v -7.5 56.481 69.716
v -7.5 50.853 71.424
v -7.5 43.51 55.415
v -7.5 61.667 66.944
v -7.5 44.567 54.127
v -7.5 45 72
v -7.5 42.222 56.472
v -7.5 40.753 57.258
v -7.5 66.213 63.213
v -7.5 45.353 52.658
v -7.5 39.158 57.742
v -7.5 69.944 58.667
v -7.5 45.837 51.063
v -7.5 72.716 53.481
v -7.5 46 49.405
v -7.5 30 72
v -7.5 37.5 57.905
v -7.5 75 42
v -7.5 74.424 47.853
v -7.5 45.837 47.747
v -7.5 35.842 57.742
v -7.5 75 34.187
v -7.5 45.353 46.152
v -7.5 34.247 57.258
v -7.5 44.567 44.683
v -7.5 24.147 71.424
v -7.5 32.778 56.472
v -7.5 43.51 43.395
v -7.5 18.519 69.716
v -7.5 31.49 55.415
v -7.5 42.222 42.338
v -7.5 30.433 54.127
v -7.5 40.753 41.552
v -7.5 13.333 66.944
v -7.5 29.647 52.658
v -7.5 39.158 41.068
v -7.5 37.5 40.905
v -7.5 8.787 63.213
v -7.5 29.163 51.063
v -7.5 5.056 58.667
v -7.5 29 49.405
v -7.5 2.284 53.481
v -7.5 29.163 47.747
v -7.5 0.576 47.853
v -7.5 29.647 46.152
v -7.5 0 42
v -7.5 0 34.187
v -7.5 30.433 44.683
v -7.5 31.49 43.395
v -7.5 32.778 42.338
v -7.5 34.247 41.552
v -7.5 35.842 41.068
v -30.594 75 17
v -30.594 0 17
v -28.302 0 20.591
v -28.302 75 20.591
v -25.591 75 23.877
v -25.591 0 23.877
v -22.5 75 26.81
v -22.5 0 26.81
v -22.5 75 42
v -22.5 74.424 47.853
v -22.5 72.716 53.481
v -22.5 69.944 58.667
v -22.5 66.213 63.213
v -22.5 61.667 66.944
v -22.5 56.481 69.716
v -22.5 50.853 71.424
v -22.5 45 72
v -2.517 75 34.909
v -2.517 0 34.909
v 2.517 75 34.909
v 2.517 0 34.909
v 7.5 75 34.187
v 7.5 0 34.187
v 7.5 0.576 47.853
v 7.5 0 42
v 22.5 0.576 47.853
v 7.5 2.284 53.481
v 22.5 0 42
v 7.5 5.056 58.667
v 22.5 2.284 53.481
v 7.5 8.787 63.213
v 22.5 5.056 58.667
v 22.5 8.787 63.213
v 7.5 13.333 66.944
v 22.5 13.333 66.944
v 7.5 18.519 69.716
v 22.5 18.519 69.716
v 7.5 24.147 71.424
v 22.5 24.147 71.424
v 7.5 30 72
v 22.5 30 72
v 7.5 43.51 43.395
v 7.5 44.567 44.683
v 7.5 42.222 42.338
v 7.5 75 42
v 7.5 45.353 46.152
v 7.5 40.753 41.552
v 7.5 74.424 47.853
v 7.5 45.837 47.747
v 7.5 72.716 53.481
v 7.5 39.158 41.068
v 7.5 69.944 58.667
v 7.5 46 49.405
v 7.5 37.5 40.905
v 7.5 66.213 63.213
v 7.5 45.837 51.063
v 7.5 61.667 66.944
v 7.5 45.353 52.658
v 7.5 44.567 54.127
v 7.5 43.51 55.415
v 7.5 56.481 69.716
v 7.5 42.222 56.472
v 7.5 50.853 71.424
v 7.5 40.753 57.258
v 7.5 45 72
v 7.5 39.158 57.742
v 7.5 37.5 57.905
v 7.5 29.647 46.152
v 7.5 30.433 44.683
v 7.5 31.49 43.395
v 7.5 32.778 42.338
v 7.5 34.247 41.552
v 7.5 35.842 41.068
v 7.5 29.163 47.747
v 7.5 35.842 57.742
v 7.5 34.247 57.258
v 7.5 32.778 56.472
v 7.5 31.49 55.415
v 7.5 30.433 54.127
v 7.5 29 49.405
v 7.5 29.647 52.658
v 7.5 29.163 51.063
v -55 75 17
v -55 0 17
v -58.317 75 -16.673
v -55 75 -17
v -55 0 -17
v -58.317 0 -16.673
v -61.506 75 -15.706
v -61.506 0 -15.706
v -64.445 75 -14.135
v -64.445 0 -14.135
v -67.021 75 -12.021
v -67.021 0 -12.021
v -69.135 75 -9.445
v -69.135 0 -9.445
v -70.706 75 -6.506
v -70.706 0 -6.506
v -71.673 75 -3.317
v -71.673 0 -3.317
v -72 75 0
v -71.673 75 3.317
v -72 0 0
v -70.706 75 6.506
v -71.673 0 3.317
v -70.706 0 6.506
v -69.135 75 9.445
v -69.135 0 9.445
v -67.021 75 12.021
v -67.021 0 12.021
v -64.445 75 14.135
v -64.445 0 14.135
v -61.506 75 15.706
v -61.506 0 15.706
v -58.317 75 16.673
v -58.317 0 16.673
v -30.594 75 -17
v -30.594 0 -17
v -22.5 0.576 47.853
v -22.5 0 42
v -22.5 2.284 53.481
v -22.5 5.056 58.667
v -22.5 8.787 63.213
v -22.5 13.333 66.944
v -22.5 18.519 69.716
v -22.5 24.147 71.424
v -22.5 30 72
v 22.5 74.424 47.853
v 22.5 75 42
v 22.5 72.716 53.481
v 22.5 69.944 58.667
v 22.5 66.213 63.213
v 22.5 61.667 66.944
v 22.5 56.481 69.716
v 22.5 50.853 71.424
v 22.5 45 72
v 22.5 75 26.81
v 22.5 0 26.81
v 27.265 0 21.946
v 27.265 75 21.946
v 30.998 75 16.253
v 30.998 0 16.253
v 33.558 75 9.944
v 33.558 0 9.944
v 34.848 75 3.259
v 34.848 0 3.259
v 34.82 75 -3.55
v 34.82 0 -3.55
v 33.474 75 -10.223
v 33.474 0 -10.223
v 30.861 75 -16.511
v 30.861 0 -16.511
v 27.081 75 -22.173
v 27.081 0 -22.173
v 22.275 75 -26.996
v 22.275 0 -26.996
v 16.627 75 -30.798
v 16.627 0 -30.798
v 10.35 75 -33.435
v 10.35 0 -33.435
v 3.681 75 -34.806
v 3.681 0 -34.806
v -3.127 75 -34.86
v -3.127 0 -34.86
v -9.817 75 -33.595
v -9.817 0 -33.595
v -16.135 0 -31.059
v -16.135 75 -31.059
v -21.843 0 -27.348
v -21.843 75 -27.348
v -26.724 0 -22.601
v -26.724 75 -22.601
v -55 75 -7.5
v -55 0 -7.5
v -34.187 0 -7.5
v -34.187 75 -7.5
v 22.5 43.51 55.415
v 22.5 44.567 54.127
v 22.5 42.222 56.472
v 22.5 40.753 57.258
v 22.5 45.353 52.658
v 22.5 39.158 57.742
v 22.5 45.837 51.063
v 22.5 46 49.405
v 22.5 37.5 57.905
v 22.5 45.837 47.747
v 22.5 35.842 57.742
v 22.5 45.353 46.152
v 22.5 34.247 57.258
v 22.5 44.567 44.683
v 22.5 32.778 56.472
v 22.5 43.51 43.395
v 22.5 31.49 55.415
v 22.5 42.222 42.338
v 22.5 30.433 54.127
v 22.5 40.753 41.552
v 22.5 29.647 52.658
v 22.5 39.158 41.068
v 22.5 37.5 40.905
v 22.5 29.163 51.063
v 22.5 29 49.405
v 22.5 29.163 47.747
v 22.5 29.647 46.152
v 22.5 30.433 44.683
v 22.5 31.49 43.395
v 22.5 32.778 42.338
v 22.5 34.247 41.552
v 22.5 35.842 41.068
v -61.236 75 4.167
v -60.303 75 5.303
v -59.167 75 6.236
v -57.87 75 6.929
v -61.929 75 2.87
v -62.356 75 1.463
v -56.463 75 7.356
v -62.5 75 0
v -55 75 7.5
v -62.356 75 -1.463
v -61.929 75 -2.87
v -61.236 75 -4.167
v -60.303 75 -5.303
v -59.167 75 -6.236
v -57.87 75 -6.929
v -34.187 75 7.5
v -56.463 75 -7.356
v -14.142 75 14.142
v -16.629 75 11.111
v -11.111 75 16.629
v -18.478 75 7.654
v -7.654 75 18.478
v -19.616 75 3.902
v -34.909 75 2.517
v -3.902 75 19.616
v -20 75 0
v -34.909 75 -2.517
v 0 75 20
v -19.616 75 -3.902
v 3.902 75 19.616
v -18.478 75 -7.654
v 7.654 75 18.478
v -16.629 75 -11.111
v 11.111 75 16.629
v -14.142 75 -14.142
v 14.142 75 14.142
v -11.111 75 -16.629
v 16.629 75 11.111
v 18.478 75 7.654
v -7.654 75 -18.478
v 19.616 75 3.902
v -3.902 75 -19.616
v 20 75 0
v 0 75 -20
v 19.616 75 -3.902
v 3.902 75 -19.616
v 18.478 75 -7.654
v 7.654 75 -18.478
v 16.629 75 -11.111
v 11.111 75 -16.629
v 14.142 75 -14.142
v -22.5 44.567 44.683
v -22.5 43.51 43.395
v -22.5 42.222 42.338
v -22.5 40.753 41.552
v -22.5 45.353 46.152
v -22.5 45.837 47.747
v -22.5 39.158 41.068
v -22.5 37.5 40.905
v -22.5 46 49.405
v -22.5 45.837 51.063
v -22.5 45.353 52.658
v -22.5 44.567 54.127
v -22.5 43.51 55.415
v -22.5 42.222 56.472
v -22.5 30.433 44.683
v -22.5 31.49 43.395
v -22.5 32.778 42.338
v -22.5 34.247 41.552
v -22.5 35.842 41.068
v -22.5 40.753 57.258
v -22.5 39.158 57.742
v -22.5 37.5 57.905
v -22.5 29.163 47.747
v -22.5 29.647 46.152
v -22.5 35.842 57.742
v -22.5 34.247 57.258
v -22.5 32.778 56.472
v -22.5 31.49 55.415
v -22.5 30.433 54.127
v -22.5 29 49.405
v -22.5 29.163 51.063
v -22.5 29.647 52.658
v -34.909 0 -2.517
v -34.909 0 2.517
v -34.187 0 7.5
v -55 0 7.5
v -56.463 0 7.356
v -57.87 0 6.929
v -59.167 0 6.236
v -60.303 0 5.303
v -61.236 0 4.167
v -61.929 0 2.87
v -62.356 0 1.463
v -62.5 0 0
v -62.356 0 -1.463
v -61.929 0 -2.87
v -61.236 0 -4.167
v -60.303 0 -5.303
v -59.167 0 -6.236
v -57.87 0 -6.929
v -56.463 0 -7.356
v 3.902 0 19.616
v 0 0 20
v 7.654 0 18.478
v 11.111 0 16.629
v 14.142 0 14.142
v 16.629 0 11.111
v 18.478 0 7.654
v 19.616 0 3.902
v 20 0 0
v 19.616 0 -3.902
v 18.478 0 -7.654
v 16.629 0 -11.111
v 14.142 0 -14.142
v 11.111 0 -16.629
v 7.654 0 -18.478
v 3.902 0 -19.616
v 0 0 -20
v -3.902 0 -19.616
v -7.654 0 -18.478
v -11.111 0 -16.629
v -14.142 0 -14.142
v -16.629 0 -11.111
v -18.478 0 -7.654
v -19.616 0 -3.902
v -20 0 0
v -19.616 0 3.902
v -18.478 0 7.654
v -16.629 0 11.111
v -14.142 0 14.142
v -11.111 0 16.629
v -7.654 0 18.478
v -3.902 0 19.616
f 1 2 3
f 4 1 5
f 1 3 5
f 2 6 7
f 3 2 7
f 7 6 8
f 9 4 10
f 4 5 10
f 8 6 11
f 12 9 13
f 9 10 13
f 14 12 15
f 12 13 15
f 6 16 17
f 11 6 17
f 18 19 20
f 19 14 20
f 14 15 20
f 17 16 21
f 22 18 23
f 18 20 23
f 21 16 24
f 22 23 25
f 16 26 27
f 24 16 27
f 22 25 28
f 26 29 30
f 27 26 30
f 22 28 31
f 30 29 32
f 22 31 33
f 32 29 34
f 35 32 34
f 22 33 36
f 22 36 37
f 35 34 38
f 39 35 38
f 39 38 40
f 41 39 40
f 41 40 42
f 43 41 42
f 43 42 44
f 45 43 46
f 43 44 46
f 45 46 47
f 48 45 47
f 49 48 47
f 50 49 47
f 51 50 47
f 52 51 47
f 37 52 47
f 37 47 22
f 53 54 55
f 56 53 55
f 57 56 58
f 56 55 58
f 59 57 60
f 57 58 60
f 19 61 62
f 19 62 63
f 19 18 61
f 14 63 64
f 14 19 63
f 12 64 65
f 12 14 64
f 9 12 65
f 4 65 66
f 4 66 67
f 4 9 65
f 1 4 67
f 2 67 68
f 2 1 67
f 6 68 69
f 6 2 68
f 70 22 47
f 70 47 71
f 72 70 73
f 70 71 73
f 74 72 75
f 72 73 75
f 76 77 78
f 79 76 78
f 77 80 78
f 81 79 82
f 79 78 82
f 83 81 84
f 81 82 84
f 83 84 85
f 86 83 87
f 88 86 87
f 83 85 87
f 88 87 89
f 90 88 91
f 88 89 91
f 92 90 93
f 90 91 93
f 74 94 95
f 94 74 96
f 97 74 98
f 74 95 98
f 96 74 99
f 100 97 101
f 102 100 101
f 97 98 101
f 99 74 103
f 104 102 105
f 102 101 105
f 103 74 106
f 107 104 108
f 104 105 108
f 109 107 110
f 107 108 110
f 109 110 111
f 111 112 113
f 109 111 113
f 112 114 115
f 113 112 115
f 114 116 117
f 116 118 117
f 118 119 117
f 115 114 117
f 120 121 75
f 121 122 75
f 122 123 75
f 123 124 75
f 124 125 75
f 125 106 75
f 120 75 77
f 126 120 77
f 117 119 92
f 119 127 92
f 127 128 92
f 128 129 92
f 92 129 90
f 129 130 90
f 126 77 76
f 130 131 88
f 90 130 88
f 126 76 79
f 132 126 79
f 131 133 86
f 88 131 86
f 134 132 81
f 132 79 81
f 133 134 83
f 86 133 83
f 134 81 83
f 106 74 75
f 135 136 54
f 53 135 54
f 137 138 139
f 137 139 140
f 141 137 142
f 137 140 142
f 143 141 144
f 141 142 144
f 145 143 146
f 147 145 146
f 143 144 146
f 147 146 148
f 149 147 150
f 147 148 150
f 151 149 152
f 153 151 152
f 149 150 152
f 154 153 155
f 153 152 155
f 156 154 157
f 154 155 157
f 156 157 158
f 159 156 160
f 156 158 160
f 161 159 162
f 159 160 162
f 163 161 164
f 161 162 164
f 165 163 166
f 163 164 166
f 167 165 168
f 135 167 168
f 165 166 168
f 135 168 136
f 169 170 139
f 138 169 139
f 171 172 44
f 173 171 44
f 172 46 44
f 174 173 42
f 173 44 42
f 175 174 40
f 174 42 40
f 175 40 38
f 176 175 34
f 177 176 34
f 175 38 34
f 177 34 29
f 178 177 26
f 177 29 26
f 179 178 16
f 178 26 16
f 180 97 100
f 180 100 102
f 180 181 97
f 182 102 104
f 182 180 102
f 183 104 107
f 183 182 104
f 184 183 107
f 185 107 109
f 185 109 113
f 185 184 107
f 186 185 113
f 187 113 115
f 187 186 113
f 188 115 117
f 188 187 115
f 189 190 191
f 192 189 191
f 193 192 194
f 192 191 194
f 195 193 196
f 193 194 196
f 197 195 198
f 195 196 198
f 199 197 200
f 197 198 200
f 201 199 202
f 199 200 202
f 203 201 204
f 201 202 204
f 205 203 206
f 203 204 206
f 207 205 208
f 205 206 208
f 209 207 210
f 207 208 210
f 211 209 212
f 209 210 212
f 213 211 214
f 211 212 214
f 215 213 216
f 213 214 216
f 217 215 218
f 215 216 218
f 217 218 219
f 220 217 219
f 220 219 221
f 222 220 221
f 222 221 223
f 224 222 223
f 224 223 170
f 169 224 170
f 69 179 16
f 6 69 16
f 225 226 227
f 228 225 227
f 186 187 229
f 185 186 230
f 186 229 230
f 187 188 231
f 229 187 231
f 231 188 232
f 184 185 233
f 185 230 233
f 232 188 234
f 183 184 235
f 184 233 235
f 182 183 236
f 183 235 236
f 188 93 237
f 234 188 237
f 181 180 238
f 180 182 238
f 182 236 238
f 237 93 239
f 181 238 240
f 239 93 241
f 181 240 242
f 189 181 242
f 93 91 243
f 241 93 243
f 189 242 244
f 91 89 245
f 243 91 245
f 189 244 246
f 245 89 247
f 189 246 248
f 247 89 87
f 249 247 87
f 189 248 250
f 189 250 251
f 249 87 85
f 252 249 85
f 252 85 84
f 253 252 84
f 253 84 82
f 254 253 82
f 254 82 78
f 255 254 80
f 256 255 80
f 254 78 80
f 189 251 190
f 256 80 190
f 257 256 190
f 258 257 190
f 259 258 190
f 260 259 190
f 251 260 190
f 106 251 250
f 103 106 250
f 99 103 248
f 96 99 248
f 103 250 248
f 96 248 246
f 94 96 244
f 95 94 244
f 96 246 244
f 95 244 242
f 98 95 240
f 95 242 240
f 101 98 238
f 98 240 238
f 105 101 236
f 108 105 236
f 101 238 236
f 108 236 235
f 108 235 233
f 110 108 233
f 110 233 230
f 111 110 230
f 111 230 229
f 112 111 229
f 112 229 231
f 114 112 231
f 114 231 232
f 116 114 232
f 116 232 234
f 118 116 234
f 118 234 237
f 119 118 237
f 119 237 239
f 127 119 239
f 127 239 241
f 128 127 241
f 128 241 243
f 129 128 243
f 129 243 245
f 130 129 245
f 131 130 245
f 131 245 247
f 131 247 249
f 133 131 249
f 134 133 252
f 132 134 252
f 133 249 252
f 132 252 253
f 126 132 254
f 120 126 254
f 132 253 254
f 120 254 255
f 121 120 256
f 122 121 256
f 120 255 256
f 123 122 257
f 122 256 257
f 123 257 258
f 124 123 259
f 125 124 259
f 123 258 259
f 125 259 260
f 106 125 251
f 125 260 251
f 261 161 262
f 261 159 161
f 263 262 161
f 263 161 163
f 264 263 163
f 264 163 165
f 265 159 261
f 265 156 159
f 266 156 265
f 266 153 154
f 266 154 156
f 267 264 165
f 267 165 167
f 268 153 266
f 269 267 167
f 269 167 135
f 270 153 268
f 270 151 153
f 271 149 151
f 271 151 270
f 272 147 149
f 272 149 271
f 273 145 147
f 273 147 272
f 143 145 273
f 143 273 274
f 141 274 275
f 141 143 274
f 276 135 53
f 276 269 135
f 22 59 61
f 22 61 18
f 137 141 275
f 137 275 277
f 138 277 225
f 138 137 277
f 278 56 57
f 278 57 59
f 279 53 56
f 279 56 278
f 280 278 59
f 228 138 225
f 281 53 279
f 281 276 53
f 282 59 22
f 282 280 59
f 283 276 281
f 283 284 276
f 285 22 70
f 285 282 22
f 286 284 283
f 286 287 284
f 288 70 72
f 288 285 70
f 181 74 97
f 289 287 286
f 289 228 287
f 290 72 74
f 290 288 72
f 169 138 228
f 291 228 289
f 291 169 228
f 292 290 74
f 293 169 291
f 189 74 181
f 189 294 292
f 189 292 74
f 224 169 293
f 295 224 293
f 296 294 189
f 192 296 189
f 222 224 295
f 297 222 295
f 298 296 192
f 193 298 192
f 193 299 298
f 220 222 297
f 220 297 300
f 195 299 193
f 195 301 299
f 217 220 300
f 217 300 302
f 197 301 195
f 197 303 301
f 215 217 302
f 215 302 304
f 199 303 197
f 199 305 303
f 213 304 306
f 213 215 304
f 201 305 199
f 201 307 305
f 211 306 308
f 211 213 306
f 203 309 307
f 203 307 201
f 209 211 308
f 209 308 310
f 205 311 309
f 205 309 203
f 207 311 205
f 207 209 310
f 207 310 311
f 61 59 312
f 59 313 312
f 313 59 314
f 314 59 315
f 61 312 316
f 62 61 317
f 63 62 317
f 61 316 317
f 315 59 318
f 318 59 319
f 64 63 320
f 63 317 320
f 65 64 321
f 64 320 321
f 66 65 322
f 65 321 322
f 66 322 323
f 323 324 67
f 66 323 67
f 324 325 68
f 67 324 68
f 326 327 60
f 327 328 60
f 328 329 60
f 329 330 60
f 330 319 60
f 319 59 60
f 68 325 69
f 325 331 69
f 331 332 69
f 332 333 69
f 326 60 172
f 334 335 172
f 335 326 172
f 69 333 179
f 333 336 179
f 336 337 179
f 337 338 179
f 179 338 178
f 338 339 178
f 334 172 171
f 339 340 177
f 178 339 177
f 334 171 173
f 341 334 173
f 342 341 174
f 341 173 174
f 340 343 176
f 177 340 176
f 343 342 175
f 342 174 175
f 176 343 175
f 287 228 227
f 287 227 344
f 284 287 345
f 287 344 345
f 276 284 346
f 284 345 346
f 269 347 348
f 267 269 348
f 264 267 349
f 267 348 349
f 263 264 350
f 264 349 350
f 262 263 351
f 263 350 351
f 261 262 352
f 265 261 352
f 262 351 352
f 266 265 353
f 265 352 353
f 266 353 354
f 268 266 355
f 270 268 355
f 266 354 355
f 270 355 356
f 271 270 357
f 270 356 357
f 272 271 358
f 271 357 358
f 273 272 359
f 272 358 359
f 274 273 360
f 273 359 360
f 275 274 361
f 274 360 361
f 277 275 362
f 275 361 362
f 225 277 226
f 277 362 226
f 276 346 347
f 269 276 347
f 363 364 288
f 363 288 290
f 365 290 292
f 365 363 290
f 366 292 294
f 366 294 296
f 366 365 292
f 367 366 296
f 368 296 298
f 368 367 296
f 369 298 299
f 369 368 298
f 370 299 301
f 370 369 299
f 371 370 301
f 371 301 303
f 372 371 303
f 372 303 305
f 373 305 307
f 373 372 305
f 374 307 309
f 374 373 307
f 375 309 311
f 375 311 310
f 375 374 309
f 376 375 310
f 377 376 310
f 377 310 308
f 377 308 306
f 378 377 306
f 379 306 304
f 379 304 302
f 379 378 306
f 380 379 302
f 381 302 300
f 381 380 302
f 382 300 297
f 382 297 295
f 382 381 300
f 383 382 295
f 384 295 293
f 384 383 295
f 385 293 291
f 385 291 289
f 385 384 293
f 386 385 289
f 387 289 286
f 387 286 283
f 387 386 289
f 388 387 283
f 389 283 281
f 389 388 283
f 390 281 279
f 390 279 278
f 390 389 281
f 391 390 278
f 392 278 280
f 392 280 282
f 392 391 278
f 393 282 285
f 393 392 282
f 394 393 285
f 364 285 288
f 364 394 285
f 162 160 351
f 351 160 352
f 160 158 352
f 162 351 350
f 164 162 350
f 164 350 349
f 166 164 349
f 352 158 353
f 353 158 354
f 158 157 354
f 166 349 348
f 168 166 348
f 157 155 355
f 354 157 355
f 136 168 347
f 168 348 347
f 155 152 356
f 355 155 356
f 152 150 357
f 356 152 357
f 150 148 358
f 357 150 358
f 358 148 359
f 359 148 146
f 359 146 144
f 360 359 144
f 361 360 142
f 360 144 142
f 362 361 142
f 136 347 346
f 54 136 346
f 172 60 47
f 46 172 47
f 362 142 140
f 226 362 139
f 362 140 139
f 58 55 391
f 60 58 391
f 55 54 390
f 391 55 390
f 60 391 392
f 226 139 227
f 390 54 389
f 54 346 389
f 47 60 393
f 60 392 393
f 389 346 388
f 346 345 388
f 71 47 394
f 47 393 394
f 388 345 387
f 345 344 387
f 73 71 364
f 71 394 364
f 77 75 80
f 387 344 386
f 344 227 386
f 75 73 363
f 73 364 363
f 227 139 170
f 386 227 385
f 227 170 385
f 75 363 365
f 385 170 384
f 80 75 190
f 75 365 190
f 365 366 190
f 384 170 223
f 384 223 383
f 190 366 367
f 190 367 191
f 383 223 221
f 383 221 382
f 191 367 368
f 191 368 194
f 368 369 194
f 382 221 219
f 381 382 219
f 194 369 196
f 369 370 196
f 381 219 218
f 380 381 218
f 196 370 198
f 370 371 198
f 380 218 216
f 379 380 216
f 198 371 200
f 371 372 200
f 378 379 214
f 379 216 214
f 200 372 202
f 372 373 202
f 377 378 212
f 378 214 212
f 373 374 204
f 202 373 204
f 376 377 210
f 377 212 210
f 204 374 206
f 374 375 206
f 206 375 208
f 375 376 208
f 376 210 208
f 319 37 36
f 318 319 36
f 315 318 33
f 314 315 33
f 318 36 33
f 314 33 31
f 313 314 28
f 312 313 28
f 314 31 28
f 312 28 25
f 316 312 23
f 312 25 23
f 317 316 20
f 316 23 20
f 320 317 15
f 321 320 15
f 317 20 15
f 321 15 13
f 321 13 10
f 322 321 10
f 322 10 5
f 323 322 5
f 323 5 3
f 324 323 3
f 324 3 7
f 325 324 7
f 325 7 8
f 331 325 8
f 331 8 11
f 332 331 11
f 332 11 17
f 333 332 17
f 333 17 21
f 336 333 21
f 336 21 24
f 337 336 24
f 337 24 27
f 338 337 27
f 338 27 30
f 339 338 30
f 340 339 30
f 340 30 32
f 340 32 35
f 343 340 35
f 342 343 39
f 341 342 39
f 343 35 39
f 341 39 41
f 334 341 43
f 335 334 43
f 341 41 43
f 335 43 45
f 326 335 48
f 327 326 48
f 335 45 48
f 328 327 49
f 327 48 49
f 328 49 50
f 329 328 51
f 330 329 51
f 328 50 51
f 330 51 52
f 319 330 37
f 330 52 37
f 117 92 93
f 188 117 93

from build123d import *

# Parameters (mm, degrees)
SKETCH1_R                      = 35
SKETCH1_R_2                    = 20
BOSS_EXTRUDE2_DEPTH            = 75
CUT_EXTRUDE1_REACH             = 142.496
SKETCH2_R                      = 8.5
CUT_EXTRUDE1_DIRECTION_2_DEPTH = 141.496441236
FILLET1_R                      = 30


with BuildPart() as part:
    # Sketch1 → Boss-Extrude2 (new body)
    # profile 1 of 4: a face of its own
    with BuildSketch(Plane(origin=(0, 0, 0), x_dir=(1, 0, 0), z_dir=(0, 1, 0))):
        Circle(SKETCH1_R)
        with Locations(Location((0, 0, 0), (0, 0, 270))):
            Circle(SKETCH1_R_2, mode=Mode.SUBTRACT)
    # profile 2 of 4: a face of its own
    with BuildSketch(Plane(origin=(0, 0, 0), x_dir=(1, 0, 0), z_dir=(0, 1, 0))):
        with BuildLine():
            ThreePointArc((-55, 17), (-72, 0), (-55, -17))
            Line((-55, -17), (-30.594117082, -17))
            ThreePointArc((-30.594117082, -17), (-32.736987087, -12.381020816), (-34.186985828, -7.5))
            Line((-34.186985828, -7.5), (-55, -7.5))
            ThreePointArc((-55, -7.5), (-62.5, 0), (-55, 7.5))
            Line((-55, 7.5), (-34.186985828, 7.5))
            ThreePointArc((-34.186985828, 7.5), (-32.736987087, 12.381020816), (-30.594117082, 17))
            Line((-30.594117082, 17), (-55, 17))
        make_face()
    # profile 3 of 4: a face of its own
    with BuildSketch(Plane(origin=(0, 0, 0), x_dir=(1, 0, 0), z_dir=(0, 1, 0))):
        with BuildLine():
            ThreePointArc((-7.5, -34.186985828), (-15.446901808, -31.406897722), (-22.5, -26.809513237))
            Line((-22.5, -26.809513237), (-22.5, -72))
            Line((-22.5, -72), (-7.5, -72))
            Line((-7.5, -72), (-7.5, -34.186985828))
        make_face()
    # profile 4 of 4: a face of its own
    with BuildSketch(Plane(origin=(0, 0, 0), x_dir=(1, 0, 0), z_dir=(0, 1, 0))):
        with BuildLine():
            ThreePointArc((22.5, -26.809513237), (15.446901808, -31.406897722), (7.5, -34.186985828))
            Line((7.5, -34.186985828), (7.5, -72))
            Line((7.5, -72), (22.5, -72))
            Line((22.5, -72), (22.5, -26.809513237))
        make_face()
    extrude(amount=BOSS_EXTRUDE2_DEPTH)

    # Cut-Extrude1: up to this face of the body (flat: up to its plane)
    cut_extrude1_end = Plane(part.part.faces().sort_by_distance((-22.5, 37.5, 49.404756618))[0])
    # Sketch2 → Cut-Extrude1 (cut, up to the picked face)
    with BuildSketch(Plane(origin=(22.5, 0, 0), x_dir=(0, 0, -1), z_dir=(1, 0, 0)), mode=Mode.PRIVATE) as cut_extrude1_sk1:
        with Locations((-49.405, 37.5)):
            Circle(SKETCH2_R)
    cut_extrude1_tool1 = split(extrude(cut_extrude1_sk1.sketch, amount=-CUT_EXTRUDE1_REACH, mode=Mode.PRIVATE), bisect_by=cut_extrude1_end, keep=Keep.BOTH, mode=Mode.PRIVATE)
    add(cut_extrude1_tool1.solids().sort_by(Axis((22.5, 37.5, 49.405), (-1, 0, 0)))[0], mode=Mode.SUBTRACT)

    # Sketch2 → Cut-Extrude1 direction 2 (cut)
    with BuildSketch(Plane(origin=(22.5, 0, 0), x_dir=(0, 0, -1), z_dir=(1, 0, 0))):
        with Locations((-49.405, 37.5)):
            Circle(SKETCH2_R)
    extrude(amount=CUT_EXTRUDE1_DIRECTION_2_DEPTH, mode=Mode.SUBTRACT)

    # Fillet1
    fillet1_edges = [part.edges().sort_by_distance(p)[0] for p in [
        (-15, 0, 72),
        (15, 0, 72),
        (15, 75, 72),
        (-15, 75, 72),
    ]]
    fillet(fillet1_edges, radius=FILLET1_R)


solid = part.part
